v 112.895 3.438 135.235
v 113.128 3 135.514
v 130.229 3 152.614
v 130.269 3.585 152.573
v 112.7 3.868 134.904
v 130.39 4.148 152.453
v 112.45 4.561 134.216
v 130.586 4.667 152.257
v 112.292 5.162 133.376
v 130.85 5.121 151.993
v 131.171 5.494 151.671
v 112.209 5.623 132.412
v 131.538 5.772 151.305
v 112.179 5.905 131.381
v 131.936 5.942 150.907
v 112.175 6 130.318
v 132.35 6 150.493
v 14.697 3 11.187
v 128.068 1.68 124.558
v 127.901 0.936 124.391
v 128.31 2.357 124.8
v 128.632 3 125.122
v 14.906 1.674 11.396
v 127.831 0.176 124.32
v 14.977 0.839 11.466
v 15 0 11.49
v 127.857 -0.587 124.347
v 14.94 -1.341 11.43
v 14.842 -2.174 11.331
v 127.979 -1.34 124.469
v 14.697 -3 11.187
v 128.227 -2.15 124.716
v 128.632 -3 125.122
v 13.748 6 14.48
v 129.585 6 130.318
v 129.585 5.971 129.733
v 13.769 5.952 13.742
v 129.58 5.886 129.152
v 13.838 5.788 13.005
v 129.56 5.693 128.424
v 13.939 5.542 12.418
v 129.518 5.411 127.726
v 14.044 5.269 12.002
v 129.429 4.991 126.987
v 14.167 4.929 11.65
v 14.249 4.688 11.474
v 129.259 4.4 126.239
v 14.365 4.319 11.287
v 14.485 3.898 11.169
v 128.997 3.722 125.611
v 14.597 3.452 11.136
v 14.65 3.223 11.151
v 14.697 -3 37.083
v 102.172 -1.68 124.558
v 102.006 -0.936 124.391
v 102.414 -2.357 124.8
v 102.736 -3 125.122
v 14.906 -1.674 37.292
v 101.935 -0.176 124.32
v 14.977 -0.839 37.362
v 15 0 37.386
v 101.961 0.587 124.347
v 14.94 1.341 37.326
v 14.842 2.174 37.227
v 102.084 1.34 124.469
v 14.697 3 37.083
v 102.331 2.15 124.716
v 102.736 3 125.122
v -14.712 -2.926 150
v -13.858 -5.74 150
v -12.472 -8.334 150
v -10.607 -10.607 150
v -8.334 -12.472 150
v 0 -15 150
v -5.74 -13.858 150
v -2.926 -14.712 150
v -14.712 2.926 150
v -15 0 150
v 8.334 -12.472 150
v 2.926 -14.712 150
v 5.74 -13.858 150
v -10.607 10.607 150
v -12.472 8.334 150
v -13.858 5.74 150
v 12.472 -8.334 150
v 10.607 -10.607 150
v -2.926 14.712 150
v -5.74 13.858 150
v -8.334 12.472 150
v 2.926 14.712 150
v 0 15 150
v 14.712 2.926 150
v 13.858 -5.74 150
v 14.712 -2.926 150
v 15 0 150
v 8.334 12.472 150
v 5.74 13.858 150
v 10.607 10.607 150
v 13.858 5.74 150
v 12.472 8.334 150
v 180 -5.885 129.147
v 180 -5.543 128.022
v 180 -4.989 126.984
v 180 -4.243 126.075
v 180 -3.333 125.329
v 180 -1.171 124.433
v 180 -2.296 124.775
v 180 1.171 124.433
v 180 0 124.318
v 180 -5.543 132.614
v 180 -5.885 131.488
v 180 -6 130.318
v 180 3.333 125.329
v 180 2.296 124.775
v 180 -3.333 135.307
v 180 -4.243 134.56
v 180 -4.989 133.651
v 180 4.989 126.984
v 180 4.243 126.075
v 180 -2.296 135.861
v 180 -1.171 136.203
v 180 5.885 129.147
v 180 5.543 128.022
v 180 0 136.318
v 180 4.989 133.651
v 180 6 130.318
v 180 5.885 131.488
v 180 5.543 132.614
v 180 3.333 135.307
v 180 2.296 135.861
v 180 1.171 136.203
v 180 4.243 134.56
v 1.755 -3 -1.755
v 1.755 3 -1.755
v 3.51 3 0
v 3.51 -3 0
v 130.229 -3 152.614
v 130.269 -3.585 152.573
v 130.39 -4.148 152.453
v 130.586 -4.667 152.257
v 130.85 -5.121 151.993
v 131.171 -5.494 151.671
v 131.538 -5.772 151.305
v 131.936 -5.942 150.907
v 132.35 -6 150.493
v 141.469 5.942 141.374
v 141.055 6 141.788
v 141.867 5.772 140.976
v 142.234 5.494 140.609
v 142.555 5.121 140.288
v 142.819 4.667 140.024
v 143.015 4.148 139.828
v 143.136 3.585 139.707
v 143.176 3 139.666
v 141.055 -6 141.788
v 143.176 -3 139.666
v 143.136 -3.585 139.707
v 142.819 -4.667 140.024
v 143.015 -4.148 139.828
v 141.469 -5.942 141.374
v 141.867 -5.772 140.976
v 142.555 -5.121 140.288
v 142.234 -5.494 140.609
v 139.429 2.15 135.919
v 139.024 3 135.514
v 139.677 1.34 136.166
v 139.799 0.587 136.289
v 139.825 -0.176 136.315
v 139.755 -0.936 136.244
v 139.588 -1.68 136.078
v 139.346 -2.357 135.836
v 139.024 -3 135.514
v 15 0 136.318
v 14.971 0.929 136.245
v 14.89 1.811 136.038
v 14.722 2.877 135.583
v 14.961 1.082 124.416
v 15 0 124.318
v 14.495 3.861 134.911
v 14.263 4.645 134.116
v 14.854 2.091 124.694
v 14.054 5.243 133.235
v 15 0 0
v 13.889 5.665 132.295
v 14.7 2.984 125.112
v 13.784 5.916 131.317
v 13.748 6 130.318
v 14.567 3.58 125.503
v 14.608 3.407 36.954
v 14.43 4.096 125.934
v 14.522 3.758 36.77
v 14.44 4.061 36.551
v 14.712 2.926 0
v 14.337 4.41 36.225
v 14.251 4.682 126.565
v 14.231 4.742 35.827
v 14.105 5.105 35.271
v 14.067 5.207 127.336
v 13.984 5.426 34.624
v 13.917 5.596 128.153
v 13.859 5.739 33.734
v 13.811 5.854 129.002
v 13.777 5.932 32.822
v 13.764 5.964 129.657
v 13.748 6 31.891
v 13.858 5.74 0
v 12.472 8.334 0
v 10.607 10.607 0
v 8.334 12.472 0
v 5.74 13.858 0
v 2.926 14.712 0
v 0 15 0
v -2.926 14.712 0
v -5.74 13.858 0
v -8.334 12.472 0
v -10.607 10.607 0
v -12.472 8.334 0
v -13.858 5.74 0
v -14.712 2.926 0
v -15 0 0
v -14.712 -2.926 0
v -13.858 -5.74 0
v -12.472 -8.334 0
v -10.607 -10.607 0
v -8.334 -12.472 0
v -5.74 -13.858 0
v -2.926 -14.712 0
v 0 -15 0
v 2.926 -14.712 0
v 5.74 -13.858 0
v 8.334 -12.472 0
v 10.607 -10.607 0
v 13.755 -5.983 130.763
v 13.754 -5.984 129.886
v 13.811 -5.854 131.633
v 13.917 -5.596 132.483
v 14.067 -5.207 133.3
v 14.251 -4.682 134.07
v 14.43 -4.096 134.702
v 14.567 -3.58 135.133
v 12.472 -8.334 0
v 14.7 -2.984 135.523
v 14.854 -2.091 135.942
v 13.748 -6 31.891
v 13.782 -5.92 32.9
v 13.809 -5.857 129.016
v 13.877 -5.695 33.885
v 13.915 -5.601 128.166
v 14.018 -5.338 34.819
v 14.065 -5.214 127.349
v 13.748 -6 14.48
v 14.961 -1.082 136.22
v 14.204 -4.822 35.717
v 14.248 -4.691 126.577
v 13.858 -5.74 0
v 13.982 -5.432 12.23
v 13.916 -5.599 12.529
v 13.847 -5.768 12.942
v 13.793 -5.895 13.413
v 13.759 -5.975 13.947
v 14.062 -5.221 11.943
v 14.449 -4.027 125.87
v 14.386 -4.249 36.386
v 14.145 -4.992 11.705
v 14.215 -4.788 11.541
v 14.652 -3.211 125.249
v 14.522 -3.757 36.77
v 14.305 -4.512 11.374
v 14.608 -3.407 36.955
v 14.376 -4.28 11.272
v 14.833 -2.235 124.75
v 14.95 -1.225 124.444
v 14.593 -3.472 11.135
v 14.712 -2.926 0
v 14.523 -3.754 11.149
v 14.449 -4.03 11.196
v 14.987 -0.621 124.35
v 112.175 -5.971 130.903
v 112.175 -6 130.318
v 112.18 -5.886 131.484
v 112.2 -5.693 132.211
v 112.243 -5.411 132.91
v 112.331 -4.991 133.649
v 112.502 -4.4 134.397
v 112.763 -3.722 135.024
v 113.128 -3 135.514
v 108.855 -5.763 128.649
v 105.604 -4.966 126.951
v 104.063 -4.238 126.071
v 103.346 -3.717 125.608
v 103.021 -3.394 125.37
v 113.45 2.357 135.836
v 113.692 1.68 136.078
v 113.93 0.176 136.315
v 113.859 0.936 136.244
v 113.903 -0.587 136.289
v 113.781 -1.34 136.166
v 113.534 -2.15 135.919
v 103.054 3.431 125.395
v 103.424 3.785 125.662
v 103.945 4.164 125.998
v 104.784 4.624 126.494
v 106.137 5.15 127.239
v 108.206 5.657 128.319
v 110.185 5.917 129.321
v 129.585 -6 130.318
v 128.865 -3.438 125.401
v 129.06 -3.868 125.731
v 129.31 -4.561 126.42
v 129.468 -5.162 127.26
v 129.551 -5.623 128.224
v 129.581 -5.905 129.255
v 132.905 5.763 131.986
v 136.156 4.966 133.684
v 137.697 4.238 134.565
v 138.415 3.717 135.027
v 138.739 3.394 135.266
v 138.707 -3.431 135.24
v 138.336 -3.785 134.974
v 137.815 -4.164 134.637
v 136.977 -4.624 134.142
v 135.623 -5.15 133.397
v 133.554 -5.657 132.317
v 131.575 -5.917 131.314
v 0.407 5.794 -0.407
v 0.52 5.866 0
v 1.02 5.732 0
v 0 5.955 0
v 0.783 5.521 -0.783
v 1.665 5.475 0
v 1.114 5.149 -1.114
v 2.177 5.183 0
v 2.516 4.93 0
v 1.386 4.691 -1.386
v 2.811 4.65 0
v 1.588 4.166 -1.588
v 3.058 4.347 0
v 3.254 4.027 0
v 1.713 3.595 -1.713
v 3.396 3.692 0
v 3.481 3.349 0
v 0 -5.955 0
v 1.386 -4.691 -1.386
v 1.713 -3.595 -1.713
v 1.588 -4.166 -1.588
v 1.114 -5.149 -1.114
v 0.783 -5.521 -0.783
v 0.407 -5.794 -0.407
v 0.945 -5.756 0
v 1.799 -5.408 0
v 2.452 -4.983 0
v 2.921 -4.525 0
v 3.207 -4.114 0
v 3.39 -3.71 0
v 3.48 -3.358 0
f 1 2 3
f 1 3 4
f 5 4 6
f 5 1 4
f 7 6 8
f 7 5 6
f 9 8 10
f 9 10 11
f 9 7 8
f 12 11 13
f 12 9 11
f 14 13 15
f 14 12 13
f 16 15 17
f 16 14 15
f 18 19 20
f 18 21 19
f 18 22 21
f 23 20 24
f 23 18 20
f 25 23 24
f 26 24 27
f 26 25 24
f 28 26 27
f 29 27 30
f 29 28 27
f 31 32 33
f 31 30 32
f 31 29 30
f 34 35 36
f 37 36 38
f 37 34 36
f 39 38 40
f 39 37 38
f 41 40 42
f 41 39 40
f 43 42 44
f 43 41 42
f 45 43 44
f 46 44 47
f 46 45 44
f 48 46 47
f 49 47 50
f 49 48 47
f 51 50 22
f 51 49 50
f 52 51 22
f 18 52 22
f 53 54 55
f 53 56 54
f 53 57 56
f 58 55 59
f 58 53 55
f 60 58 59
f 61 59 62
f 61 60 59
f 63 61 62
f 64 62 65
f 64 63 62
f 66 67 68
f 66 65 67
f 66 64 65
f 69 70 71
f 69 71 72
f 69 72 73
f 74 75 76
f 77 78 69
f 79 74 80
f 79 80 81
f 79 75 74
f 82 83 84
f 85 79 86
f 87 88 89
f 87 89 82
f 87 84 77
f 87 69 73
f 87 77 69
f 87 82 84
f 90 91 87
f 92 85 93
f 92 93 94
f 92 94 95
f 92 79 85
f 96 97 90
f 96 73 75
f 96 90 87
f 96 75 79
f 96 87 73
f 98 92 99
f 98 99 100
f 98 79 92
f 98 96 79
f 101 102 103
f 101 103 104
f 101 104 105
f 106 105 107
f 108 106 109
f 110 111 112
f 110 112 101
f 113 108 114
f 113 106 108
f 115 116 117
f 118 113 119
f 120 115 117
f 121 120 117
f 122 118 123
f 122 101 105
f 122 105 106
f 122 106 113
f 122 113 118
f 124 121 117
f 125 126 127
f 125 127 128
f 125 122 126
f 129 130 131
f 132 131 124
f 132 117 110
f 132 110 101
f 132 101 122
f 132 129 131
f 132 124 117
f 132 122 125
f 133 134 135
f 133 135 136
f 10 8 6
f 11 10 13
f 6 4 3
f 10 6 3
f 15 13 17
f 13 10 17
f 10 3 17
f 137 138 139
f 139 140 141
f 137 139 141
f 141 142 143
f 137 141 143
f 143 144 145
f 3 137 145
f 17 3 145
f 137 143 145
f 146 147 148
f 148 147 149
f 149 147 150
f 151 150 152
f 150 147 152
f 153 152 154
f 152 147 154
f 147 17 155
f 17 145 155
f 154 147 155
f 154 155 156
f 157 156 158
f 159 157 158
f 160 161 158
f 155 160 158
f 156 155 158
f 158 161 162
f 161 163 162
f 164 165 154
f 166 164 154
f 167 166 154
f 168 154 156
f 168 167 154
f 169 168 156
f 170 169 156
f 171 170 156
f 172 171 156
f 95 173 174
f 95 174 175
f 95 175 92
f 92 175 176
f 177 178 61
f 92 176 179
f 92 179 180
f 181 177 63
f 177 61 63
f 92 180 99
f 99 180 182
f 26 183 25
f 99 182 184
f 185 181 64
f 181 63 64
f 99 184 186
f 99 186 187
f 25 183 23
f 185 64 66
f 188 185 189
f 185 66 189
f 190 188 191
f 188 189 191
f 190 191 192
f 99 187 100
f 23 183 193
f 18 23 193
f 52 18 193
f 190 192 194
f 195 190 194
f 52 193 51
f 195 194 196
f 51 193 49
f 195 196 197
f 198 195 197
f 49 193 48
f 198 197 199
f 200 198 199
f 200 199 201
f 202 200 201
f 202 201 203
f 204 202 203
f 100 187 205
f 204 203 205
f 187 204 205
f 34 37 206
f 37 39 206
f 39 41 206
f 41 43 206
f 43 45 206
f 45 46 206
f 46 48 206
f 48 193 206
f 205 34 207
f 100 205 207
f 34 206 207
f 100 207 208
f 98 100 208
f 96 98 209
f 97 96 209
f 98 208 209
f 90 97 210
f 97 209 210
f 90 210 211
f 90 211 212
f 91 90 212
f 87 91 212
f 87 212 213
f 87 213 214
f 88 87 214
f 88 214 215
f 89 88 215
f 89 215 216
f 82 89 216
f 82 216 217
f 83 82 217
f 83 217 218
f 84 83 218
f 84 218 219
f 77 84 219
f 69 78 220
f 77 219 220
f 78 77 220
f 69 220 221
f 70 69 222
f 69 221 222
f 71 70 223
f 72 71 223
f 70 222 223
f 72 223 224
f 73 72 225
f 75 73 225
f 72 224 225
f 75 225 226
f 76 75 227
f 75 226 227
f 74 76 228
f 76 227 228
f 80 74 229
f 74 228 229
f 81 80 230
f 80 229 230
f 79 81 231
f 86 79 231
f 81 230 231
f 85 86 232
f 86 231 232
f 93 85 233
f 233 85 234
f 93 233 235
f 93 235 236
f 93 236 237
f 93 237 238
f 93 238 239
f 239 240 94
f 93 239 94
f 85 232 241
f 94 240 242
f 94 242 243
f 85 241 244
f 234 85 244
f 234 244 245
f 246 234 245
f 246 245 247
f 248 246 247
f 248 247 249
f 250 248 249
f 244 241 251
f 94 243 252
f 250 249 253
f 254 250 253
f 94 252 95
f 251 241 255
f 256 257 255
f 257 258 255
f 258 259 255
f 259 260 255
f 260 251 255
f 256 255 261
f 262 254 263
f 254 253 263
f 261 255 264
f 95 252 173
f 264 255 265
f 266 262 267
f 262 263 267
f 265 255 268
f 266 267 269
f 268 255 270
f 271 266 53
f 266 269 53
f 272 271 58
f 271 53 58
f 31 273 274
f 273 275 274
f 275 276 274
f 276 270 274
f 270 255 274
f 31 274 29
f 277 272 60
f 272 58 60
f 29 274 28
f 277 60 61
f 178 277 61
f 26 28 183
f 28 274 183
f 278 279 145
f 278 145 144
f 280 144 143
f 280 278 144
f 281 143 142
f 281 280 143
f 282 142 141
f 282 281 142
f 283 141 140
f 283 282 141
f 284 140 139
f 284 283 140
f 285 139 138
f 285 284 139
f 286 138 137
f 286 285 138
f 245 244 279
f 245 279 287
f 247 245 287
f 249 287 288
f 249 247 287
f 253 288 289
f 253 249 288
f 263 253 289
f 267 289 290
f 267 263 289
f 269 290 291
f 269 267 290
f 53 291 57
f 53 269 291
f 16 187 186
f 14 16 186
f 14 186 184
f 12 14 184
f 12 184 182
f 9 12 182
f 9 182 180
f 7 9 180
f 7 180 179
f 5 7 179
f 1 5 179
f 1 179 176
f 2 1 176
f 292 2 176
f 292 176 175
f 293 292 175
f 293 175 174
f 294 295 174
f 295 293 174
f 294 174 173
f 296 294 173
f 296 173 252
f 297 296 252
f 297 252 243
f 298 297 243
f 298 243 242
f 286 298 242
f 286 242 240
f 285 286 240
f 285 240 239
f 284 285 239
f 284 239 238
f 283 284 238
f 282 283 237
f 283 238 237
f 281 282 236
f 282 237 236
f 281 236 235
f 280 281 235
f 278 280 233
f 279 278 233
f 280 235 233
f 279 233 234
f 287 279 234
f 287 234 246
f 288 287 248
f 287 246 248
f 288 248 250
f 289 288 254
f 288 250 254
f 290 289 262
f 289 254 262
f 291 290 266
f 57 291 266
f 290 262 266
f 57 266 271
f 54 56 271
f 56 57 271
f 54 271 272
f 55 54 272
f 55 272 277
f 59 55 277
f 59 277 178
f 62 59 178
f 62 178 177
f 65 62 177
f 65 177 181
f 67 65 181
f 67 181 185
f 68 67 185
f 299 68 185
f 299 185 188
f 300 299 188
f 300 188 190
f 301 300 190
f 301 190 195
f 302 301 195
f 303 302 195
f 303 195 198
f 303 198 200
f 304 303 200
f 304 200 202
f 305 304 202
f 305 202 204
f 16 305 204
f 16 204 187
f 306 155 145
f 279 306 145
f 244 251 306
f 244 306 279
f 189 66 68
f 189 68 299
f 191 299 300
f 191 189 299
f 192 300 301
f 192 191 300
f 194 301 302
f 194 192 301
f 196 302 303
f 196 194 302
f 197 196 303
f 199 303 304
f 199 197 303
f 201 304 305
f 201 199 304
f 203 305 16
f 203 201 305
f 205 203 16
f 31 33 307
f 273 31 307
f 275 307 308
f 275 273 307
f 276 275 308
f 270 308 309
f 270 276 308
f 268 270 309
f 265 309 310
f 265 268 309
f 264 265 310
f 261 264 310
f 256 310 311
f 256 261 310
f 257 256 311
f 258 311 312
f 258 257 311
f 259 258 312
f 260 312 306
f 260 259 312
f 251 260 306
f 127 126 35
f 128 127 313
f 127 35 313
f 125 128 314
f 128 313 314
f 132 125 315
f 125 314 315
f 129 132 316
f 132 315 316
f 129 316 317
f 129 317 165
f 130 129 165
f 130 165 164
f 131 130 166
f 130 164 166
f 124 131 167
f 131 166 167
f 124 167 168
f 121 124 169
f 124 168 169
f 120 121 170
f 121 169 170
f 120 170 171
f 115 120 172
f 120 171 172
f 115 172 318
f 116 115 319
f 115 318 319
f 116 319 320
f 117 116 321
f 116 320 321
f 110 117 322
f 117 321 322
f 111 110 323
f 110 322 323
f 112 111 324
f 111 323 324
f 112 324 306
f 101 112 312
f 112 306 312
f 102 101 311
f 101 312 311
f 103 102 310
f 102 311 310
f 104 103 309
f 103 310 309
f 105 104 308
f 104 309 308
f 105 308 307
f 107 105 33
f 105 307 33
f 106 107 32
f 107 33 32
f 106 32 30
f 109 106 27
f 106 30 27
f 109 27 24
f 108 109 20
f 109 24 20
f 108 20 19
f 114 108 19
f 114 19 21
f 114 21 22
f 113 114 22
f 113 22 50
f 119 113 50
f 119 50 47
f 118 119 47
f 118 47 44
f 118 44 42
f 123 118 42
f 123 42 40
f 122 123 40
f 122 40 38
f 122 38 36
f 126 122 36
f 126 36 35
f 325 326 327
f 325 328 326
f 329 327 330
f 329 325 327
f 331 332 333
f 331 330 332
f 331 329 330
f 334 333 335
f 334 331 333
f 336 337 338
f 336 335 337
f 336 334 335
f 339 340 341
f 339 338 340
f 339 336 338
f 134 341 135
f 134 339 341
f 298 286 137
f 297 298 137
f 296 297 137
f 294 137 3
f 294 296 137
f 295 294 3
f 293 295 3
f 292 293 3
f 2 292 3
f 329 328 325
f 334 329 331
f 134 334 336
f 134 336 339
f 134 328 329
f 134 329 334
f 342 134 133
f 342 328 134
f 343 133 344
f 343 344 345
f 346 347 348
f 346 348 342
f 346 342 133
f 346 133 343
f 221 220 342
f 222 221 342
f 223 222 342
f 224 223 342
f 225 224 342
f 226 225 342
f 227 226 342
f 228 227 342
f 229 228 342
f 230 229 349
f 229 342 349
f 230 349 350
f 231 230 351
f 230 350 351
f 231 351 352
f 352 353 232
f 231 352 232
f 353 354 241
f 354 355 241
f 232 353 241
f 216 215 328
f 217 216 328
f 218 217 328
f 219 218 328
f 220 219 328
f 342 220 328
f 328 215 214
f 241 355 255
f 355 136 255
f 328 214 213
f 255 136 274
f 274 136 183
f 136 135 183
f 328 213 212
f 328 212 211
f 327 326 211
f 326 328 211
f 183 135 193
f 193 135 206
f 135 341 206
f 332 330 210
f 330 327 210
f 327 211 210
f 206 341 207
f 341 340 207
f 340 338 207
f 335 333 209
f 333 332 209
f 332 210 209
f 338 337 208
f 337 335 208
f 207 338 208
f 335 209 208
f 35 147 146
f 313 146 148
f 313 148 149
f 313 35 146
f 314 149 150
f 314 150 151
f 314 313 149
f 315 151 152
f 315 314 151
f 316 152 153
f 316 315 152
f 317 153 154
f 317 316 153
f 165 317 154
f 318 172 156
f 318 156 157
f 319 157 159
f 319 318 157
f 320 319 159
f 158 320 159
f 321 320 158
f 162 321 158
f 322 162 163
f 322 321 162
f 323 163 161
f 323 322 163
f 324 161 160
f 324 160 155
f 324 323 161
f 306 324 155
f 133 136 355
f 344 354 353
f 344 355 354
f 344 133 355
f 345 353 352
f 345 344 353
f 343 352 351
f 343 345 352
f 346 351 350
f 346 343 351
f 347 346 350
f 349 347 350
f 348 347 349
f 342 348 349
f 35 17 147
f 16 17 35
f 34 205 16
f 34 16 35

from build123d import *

# Parameters (mm, degrees)
F0_R     = 15
F1_DEPTH = 150
F2_R     = 6
F3_DEPTH = 180
F7_DEPTH = 200


with BuildPart() as f1:
    # F0 (on Top) → F1 (new body)
    with BuildSketch(Plane.XY):
        Circle(F0_R)
    extrude(amount=F1_DEPTH)

    # F2 (on Right) → F3 (join)
    with BuildSketch(Plane.YZ):
        with Locations((0, 130.317822)):
            Circle(F2_R)
    extrude(amount=F3_DEPTH)

    # F6 (on face) → F7 (join)
    with BuildSketch(Plane(origin=(0, 0, 0), x_dir=(0.707107, 0, -0.707107), z_dir=(-0.707107, 0, -0.707107))):
        with BuildLine():
            Line((-0.517934, 6), (-12.829055, 6))
            ThreePointArc((-12.829055, 6), (-14.950375, 5.12132), (-15.829055, 3))
            Line((-15.829055, 3), (-15.829055, -3))
            ThreePointArc((-15.829055, -3), (-14.950375, -5.12132), (-12.829055, -6))
            Line((-12.829055, -6), (-0.517934, -6))
            ThreePointArc((-0.517934, -6), (1.603386, -5.12132), (2.482066, -3))
            Line((2.482066, -3), (2.482066, 3))
            ThreePointArc((2.482066, 3), (1.603386, 5.12132), (-0.517934, 6))
        make_face()
    extrude(amount=-F7_DEPTH)


solid = f1.part
